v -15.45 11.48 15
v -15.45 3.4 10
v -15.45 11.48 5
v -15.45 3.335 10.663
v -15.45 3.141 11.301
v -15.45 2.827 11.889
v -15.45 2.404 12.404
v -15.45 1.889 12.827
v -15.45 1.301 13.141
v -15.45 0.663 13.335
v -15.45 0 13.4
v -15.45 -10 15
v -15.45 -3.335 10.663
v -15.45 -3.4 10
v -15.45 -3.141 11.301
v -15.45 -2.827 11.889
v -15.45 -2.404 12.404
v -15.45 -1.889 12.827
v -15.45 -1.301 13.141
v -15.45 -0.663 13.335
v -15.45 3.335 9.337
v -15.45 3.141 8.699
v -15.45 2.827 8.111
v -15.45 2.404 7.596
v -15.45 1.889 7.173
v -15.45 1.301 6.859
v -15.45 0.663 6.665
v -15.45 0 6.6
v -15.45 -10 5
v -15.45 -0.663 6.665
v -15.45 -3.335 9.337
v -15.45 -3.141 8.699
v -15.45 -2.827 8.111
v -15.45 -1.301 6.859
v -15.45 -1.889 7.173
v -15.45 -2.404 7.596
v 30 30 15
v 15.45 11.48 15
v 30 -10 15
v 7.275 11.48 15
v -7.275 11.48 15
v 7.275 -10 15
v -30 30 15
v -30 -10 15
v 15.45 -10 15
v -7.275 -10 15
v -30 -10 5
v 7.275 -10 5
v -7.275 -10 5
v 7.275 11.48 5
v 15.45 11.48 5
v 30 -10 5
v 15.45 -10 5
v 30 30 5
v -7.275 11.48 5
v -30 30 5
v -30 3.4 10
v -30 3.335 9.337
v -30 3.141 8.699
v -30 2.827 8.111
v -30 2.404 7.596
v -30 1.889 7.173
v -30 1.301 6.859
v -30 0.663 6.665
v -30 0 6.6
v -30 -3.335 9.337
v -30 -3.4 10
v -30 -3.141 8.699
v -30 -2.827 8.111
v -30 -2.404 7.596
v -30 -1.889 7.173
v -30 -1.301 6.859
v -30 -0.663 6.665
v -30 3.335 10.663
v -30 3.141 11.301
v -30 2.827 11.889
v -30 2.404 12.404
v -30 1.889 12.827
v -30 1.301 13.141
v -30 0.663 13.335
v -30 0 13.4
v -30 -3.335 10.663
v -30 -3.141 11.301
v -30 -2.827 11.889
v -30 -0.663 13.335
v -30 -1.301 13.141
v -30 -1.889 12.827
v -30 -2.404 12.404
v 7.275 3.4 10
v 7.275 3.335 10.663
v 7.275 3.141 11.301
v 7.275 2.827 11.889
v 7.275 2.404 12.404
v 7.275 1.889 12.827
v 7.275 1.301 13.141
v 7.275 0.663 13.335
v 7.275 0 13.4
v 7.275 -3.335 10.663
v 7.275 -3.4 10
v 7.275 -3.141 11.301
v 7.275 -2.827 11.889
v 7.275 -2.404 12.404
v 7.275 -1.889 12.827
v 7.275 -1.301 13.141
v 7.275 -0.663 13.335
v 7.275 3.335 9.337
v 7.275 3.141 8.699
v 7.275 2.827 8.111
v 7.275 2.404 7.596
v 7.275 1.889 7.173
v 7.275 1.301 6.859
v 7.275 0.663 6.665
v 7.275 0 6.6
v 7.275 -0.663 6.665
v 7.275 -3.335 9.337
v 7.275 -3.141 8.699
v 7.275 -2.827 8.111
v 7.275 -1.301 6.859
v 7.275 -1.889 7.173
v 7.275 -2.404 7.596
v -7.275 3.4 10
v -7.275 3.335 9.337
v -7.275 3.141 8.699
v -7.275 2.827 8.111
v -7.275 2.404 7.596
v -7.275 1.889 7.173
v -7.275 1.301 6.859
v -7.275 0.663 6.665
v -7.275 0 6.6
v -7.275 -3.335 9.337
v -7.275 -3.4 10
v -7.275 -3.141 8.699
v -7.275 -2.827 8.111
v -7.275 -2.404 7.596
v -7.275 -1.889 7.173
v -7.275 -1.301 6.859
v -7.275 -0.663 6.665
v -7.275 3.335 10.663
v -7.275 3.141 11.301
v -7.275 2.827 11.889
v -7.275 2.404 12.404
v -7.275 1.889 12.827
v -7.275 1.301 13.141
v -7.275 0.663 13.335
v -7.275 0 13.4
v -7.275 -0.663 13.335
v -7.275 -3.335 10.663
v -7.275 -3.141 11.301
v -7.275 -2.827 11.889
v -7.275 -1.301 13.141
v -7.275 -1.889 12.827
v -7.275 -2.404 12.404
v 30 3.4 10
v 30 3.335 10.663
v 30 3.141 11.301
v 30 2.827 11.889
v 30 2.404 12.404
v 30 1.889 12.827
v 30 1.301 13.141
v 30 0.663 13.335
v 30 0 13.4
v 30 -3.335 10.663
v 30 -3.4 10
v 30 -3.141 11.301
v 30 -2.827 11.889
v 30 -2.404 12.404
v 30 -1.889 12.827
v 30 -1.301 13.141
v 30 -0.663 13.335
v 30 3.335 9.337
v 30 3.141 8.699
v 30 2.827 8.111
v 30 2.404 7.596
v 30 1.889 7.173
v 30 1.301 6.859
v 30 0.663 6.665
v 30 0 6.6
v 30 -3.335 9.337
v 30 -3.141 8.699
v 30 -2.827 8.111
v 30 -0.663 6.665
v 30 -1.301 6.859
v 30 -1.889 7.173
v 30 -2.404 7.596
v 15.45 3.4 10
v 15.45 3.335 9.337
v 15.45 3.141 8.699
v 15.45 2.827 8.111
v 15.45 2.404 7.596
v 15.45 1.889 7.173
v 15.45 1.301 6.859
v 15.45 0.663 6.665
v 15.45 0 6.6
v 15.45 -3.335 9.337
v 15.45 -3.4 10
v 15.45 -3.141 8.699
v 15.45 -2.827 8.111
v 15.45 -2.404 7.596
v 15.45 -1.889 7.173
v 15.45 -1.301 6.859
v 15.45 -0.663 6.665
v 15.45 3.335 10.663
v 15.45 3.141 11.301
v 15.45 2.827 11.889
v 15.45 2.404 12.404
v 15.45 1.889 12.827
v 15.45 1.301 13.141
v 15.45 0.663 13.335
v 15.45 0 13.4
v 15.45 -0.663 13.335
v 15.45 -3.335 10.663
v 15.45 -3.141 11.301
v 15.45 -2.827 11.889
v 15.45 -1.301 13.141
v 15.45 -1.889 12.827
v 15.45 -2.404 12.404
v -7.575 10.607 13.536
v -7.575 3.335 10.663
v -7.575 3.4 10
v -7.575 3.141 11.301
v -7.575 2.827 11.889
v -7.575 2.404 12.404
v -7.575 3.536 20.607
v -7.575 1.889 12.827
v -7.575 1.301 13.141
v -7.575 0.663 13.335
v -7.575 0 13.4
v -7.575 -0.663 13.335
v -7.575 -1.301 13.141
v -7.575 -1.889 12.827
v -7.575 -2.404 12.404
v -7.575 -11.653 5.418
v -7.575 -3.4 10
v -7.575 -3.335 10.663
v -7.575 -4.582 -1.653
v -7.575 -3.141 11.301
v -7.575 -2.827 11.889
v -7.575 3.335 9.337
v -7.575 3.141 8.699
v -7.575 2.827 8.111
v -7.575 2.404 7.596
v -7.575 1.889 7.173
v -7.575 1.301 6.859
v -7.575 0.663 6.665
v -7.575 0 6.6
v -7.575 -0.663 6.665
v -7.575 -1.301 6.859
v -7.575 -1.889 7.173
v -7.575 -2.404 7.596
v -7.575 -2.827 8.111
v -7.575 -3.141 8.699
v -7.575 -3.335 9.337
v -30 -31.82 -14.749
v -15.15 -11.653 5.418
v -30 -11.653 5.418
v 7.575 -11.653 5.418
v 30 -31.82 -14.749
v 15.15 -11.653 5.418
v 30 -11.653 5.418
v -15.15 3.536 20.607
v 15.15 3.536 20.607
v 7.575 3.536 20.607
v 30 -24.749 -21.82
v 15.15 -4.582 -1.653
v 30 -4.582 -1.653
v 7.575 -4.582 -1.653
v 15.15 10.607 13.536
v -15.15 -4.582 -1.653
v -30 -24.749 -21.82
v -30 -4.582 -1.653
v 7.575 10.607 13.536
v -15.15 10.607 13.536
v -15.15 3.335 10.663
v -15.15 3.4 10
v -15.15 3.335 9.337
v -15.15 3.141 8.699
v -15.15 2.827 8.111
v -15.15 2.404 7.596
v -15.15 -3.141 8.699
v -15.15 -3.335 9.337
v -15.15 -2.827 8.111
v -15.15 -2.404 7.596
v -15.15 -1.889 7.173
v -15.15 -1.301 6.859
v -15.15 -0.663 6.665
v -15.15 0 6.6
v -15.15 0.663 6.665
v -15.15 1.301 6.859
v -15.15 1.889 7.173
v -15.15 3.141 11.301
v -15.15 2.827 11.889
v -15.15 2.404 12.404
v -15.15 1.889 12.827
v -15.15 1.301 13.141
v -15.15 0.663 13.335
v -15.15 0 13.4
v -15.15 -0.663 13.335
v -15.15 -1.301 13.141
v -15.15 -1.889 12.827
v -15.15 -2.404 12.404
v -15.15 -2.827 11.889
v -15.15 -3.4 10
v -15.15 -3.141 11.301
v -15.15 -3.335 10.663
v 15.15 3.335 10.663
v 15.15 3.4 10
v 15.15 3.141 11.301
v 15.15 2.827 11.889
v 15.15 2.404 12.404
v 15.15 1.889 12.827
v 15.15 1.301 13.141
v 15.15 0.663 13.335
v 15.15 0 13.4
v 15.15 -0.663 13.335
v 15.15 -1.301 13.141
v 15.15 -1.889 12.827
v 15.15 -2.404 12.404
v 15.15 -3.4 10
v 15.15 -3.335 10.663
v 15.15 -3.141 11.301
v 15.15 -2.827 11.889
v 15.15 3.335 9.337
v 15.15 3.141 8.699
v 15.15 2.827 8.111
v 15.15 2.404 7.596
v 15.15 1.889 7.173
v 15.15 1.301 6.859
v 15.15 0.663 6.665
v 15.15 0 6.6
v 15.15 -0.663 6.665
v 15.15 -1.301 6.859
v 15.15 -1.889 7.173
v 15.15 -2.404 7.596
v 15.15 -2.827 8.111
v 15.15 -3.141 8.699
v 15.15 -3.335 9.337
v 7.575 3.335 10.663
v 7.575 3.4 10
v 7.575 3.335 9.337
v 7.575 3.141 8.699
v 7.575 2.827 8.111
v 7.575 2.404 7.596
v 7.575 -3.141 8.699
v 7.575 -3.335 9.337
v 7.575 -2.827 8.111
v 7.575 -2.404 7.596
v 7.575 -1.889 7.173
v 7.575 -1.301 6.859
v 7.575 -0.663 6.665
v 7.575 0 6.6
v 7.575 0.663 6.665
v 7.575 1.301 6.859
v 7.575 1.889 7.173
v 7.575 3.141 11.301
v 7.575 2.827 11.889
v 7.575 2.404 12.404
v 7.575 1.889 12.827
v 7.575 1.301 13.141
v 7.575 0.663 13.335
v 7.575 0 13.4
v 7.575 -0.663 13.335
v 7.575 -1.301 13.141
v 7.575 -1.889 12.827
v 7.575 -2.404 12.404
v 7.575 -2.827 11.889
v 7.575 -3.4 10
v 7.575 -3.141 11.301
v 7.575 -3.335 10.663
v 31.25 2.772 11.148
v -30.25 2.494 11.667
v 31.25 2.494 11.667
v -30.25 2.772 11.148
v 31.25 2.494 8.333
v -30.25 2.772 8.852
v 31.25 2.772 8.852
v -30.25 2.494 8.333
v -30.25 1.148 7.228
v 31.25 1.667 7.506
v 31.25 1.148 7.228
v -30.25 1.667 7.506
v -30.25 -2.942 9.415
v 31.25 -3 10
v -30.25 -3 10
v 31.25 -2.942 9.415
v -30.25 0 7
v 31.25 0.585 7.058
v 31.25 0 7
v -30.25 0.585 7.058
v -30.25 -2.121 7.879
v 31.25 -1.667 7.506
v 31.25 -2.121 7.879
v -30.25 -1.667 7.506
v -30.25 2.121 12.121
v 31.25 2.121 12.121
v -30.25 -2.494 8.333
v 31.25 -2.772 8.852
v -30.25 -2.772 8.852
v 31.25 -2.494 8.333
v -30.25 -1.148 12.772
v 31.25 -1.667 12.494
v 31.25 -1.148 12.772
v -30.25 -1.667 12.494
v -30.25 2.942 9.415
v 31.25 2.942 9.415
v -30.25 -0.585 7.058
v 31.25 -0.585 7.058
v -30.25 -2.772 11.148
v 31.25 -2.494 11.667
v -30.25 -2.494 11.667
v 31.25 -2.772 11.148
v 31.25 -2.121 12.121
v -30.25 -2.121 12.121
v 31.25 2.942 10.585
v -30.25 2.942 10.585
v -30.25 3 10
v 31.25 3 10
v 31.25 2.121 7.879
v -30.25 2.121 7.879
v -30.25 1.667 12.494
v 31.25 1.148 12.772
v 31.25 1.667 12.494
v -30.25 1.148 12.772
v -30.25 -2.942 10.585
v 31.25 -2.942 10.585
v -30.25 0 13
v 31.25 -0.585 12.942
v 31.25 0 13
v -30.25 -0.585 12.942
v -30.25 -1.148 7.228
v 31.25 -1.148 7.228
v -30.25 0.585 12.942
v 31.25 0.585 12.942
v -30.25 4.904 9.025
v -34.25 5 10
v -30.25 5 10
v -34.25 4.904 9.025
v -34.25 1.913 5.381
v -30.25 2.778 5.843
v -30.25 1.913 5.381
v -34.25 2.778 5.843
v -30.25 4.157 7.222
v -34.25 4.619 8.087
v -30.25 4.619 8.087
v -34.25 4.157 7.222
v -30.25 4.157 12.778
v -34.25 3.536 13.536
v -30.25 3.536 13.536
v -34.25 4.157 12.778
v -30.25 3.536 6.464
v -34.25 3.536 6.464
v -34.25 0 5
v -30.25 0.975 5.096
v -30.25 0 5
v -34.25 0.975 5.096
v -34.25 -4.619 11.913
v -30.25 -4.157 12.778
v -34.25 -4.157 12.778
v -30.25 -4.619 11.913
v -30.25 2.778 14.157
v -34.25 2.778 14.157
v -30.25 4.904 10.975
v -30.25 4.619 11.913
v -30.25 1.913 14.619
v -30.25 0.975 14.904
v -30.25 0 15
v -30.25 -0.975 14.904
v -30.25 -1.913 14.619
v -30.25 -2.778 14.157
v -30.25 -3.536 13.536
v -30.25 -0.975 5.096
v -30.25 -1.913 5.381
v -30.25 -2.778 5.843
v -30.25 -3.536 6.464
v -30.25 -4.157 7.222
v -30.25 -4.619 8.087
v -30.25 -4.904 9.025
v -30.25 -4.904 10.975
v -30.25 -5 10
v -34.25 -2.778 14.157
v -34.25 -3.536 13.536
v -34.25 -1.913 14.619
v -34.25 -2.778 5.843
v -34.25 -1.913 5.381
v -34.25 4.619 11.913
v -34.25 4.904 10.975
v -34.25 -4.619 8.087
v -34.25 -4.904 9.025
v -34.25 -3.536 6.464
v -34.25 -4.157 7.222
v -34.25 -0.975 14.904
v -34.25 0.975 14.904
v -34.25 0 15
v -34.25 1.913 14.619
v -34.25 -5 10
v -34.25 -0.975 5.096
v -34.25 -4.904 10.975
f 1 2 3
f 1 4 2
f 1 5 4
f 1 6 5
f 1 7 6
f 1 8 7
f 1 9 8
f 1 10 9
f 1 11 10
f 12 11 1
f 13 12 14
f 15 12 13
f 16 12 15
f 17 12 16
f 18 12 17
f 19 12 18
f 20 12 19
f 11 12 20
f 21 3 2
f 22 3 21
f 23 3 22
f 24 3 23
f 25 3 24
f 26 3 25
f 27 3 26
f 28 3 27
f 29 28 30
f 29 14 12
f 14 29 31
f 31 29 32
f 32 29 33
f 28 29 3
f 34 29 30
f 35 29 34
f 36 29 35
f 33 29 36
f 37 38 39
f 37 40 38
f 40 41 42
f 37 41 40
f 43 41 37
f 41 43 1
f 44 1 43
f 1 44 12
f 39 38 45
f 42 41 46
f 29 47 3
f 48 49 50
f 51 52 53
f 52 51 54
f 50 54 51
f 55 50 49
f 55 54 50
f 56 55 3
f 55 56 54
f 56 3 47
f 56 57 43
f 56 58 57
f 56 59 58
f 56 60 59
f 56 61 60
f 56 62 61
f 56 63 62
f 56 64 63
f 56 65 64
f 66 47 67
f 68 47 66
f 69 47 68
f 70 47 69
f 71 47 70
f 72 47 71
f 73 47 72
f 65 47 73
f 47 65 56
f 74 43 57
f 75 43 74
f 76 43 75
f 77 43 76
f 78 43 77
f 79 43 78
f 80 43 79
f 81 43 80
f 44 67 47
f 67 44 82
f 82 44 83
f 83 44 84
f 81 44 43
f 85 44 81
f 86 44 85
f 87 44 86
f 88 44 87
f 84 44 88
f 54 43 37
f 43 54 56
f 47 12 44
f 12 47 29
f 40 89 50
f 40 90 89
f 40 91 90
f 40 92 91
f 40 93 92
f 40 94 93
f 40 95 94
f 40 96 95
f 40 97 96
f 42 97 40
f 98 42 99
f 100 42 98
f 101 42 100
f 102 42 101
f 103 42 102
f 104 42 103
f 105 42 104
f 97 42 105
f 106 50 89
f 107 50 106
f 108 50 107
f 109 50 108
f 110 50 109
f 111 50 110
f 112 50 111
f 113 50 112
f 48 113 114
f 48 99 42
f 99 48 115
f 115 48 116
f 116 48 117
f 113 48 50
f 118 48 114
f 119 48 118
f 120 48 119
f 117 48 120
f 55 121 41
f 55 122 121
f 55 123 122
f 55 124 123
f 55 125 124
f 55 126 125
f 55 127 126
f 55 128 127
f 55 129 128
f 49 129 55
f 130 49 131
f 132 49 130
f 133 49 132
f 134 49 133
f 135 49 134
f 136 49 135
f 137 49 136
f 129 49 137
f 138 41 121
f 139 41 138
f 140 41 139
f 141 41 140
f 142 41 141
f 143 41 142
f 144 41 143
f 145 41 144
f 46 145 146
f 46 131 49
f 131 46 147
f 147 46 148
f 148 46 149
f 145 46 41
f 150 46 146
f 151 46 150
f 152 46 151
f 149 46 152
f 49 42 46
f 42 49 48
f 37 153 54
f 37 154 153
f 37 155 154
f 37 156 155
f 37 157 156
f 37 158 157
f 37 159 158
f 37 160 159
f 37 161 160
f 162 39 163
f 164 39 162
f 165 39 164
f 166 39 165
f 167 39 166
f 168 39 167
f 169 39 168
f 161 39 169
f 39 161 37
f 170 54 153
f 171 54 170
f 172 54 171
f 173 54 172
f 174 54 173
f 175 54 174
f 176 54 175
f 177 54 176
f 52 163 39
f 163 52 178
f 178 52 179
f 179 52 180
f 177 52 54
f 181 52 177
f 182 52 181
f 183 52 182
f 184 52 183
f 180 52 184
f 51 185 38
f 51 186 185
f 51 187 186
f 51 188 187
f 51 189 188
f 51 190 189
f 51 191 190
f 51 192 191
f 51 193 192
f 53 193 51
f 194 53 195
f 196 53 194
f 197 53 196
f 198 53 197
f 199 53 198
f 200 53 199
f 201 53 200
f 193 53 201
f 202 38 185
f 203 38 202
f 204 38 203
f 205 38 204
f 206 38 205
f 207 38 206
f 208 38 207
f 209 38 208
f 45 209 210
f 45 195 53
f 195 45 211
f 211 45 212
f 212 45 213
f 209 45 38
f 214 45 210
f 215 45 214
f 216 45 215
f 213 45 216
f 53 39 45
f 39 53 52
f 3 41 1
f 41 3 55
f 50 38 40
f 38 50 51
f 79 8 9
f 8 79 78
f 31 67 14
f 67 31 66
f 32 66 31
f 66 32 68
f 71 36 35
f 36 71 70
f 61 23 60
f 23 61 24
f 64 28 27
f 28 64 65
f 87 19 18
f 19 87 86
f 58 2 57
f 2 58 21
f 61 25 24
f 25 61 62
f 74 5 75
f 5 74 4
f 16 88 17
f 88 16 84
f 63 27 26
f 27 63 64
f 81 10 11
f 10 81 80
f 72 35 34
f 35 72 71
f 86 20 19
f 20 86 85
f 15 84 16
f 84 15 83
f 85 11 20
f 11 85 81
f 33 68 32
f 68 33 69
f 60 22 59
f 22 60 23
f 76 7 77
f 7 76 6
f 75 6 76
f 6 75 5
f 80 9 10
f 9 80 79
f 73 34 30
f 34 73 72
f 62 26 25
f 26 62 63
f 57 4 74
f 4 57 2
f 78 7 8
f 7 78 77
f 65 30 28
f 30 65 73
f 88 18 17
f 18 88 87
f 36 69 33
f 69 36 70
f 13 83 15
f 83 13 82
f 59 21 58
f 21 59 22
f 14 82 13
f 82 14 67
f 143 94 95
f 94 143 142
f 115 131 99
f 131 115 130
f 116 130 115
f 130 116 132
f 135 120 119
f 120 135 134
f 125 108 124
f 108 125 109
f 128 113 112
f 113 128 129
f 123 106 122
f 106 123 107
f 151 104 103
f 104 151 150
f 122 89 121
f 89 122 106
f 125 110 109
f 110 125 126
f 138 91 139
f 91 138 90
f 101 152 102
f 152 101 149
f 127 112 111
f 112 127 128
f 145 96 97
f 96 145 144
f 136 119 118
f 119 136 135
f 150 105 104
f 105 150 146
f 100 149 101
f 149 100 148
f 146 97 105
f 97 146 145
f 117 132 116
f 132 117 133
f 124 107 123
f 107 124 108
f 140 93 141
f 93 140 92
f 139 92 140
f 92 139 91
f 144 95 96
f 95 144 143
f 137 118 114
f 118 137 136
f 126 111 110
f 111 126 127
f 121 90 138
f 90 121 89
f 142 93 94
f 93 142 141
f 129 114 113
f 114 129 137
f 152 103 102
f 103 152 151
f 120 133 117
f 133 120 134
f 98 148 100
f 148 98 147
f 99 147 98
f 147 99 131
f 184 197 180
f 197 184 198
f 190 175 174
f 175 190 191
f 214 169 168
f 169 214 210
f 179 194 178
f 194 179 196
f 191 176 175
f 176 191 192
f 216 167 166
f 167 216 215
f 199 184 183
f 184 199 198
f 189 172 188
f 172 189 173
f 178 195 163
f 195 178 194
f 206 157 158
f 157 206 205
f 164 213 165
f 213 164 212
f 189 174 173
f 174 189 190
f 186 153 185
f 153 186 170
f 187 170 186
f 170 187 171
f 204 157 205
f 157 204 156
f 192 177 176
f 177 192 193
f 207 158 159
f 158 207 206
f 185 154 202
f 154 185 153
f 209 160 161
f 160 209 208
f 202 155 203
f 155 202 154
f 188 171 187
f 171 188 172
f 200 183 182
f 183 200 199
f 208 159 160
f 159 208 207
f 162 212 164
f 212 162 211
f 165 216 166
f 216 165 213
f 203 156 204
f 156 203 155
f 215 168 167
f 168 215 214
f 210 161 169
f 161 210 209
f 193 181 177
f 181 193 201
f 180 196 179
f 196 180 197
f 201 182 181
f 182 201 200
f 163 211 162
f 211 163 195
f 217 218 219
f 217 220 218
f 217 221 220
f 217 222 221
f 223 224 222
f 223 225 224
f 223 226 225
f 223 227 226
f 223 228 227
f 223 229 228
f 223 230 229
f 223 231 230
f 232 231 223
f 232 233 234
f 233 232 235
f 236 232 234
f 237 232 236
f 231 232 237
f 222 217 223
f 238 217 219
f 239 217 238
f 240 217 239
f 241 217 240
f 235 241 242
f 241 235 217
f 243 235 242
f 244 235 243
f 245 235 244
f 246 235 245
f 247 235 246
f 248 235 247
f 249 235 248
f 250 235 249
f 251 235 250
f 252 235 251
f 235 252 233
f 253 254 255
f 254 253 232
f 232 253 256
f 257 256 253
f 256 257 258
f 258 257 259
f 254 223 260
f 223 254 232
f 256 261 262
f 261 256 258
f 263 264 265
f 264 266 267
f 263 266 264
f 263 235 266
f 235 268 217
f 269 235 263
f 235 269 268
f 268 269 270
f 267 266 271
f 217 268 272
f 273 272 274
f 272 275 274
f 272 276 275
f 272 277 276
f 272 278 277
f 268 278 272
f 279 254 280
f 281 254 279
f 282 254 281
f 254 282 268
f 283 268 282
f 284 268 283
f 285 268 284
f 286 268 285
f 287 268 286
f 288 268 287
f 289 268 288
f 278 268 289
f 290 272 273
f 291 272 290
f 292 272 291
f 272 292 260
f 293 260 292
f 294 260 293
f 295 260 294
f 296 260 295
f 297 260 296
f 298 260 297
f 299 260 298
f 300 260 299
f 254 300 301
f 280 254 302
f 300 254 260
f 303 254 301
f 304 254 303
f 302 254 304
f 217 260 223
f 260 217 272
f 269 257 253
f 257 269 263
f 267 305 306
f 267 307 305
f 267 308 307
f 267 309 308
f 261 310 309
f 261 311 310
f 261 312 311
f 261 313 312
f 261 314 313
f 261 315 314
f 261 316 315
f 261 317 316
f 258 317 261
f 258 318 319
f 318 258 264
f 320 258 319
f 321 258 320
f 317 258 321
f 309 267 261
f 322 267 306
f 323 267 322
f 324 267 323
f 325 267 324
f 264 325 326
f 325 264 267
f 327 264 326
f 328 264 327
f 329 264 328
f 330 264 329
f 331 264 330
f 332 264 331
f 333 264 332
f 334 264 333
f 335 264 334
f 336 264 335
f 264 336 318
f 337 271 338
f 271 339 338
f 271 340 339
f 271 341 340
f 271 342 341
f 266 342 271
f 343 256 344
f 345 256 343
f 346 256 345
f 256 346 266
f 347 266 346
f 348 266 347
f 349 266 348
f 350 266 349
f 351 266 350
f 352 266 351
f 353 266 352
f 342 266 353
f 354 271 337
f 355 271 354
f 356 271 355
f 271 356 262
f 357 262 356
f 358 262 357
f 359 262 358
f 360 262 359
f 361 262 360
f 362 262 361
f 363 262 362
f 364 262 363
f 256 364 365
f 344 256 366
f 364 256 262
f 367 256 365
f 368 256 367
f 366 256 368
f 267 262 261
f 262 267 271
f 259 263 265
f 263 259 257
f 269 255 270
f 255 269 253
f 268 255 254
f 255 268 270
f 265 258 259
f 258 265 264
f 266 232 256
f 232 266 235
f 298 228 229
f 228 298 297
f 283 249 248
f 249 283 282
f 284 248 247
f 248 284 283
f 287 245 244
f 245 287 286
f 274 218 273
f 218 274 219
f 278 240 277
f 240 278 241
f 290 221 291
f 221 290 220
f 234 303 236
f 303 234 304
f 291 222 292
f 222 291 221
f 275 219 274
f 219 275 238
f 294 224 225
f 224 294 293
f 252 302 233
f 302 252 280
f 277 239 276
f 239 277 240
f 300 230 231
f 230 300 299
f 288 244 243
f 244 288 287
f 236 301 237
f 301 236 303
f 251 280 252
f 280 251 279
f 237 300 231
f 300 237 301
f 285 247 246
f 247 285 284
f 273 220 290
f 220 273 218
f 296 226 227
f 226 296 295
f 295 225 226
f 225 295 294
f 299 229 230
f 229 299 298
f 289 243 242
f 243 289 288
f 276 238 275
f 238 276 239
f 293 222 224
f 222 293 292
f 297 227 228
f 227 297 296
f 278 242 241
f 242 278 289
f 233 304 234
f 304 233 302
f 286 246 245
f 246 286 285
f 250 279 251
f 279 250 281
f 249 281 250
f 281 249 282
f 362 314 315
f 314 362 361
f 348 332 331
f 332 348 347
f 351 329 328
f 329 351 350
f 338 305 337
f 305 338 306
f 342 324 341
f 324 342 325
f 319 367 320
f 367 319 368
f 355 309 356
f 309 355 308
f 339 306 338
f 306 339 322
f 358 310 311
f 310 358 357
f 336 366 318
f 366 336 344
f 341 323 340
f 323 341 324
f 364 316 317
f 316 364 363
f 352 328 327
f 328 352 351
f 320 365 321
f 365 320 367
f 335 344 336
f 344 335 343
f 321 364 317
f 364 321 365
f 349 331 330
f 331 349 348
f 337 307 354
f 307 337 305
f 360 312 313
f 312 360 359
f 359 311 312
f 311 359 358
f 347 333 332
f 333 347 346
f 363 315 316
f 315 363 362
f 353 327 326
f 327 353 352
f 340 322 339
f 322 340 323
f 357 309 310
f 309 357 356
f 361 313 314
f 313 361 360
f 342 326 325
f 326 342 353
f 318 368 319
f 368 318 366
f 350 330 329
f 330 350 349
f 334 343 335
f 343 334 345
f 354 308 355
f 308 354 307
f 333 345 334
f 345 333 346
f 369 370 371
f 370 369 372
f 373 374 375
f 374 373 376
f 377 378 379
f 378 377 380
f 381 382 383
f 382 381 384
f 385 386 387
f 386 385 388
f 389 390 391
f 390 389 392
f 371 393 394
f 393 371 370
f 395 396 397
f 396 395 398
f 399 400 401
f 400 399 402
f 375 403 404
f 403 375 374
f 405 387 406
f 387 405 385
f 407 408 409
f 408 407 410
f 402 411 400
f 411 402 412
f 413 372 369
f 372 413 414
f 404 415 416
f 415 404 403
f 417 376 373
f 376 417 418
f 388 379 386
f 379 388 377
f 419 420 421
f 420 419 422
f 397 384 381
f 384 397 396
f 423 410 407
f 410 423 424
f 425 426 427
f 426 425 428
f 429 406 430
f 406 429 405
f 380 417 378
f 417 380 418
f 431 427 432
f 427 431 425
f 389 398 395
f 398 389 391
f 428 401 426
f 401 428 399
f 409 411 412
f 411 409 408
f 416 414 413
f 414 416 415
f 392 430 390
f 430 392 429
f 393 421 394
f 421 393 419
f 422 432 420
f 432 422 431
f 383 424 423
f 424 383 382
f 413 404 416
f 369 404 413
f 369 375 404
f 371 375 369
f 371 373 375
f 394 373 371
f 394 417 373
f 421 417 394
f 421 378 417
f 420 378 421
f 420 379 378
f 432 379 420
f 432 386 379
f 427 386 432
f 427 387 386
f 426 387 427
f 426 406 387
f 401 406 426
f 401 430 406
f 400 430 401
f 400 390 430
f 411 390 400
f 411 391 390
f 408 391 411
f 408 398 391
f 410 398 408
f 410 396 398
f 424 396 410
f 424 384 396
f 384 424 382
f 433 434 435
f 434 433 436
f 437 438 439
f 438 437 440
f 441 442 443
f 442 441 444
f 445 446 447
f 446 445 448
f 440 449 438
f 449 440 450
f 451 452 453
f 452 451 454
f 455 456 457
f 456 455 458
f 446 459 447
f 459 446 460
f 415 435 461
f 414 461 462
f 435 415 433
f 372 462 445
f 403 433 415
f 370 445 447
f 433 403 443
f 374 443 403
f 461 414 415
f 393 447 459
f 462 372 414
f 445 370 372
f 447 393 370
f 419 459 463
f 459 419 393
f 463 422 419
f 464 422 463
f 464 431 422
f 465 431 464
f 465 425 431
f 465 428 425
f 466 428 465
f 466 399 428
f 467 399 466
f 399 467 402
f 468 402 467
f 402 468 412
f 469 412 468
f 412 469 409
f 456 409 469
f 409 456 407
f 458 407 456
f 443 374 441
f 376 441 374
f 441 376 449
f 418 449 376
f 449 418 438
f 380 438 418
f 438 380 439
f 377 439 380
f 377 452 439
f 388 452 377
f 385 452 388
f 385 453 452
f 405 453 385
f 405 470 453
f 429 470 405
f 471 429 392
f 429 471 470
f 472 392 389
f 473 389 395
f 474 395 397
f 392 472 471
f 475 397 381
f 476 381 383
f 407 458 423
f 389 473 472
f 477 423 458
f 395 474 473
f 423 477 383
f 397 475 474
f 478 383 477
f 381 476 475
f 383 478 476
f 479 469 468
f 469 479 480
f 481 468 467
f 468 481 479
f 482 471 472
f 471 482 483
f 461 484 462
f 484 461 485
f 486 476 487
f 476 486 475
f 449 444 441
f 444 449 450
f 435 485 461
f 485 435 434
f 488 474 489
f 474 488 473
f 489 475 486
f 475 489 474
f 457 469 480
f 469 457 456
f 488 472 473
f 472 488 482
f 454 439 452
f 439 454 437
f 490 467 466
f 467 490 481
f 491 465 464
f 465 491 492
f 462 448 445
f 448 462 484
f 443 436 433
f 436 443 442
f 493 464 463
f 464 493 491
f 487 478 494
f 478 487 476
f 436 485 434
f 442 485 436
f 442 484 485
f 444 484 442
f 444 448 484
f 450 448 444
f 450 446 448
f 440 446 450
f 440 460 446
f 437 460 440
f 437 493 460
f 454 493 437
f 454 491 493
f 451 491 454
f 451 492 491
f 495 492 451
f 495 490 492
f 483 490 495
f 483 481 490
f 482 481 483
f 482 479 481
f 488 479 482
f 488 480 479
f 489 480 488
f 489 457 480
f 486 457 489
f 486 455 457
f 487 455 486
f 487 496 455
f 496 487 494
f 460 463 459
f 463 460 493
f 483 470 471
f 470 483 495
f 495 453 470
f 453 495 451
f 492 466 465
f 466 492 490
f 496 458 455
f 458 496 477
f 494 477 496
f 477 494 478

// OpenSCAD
$fn = 32;

// ------------------------------------------------------------------------
// Butt hinge: hinge 60 mm, leaf swung 45 deg
// Every part is its own module, assembly() places every instance.
// ------------------------------------------------------------------------

// --- part 1 ---
module hinge_base() {
  difference() {
    union() {
      translate([-30, -10, -5]) cube([14.55, 40, 10]);
      translate([-7.275, -10, -5]) cube([14.55, 40, 10]);
      translate([15.45, -10, -5]) cube([14.55, 40, 10]);
      translate([-30, 11.48, -5]) cube([60, 18.52, 10]);
    }
    translate([-22.725, 0, 0]) rotate([0, 90, 0]) cylinder(h = 16.55, d = 6.8, center = true);
    translate([0, 0, 0]) rotate([0, 90, 0]) cylinder(h = 16.55, d = 6.8, center = true);
    translate([22.725, 0, 0]) rotate([0, 90, 0]) cylinder(h = 16.55, d = 6.8, center = true);
  }
}

// --- part 2 ---
module hinge_mover() {
  difference() {
    union() {
      translate([-15.15, -40, -5]) cube([7.575, 50, 10]);
      translate([7.575, -40, -5]) cube([7.575, 50, 10]);
      translate([-30, -40, -5]) cube([60, 28.52, 10]);
    }
    translate([-11.362, 0, 0]) rotate([0, 90, 0]) cylinder(h = 9.575, d = 6.8, center = true);
    translate([11.362, 0, 0]) rotate([0, 90, 0]) cylinder(h = 9.575, d = 6.8, center = true);
  }
}

// --- part 3 ---
module hinge_pin() {
  rotate([0, 90, 0]) cylinder(h = 62.5, d = 6, center = true);
  translate([-34.25, 0, 0]) rotate([0, 90, 0]) cylinder(h = 4, d = 10);
}

// --- assembly ---
module assembly() {
  color([0.80, 0.24, 0.20]) translate([0, 0, 10]) rotate([0, 0, 0]) hinge_base();
  color([0.20, 0.45, 0.75]) translate([0, 0, 10]) rotate([45, 0, 0]) hinge_mover();
  color([0.25, 0.62, 0.32]) translate([0, 0, 10]) rotate([0, 0, 0]) hinge_pin();
}

assembly();
